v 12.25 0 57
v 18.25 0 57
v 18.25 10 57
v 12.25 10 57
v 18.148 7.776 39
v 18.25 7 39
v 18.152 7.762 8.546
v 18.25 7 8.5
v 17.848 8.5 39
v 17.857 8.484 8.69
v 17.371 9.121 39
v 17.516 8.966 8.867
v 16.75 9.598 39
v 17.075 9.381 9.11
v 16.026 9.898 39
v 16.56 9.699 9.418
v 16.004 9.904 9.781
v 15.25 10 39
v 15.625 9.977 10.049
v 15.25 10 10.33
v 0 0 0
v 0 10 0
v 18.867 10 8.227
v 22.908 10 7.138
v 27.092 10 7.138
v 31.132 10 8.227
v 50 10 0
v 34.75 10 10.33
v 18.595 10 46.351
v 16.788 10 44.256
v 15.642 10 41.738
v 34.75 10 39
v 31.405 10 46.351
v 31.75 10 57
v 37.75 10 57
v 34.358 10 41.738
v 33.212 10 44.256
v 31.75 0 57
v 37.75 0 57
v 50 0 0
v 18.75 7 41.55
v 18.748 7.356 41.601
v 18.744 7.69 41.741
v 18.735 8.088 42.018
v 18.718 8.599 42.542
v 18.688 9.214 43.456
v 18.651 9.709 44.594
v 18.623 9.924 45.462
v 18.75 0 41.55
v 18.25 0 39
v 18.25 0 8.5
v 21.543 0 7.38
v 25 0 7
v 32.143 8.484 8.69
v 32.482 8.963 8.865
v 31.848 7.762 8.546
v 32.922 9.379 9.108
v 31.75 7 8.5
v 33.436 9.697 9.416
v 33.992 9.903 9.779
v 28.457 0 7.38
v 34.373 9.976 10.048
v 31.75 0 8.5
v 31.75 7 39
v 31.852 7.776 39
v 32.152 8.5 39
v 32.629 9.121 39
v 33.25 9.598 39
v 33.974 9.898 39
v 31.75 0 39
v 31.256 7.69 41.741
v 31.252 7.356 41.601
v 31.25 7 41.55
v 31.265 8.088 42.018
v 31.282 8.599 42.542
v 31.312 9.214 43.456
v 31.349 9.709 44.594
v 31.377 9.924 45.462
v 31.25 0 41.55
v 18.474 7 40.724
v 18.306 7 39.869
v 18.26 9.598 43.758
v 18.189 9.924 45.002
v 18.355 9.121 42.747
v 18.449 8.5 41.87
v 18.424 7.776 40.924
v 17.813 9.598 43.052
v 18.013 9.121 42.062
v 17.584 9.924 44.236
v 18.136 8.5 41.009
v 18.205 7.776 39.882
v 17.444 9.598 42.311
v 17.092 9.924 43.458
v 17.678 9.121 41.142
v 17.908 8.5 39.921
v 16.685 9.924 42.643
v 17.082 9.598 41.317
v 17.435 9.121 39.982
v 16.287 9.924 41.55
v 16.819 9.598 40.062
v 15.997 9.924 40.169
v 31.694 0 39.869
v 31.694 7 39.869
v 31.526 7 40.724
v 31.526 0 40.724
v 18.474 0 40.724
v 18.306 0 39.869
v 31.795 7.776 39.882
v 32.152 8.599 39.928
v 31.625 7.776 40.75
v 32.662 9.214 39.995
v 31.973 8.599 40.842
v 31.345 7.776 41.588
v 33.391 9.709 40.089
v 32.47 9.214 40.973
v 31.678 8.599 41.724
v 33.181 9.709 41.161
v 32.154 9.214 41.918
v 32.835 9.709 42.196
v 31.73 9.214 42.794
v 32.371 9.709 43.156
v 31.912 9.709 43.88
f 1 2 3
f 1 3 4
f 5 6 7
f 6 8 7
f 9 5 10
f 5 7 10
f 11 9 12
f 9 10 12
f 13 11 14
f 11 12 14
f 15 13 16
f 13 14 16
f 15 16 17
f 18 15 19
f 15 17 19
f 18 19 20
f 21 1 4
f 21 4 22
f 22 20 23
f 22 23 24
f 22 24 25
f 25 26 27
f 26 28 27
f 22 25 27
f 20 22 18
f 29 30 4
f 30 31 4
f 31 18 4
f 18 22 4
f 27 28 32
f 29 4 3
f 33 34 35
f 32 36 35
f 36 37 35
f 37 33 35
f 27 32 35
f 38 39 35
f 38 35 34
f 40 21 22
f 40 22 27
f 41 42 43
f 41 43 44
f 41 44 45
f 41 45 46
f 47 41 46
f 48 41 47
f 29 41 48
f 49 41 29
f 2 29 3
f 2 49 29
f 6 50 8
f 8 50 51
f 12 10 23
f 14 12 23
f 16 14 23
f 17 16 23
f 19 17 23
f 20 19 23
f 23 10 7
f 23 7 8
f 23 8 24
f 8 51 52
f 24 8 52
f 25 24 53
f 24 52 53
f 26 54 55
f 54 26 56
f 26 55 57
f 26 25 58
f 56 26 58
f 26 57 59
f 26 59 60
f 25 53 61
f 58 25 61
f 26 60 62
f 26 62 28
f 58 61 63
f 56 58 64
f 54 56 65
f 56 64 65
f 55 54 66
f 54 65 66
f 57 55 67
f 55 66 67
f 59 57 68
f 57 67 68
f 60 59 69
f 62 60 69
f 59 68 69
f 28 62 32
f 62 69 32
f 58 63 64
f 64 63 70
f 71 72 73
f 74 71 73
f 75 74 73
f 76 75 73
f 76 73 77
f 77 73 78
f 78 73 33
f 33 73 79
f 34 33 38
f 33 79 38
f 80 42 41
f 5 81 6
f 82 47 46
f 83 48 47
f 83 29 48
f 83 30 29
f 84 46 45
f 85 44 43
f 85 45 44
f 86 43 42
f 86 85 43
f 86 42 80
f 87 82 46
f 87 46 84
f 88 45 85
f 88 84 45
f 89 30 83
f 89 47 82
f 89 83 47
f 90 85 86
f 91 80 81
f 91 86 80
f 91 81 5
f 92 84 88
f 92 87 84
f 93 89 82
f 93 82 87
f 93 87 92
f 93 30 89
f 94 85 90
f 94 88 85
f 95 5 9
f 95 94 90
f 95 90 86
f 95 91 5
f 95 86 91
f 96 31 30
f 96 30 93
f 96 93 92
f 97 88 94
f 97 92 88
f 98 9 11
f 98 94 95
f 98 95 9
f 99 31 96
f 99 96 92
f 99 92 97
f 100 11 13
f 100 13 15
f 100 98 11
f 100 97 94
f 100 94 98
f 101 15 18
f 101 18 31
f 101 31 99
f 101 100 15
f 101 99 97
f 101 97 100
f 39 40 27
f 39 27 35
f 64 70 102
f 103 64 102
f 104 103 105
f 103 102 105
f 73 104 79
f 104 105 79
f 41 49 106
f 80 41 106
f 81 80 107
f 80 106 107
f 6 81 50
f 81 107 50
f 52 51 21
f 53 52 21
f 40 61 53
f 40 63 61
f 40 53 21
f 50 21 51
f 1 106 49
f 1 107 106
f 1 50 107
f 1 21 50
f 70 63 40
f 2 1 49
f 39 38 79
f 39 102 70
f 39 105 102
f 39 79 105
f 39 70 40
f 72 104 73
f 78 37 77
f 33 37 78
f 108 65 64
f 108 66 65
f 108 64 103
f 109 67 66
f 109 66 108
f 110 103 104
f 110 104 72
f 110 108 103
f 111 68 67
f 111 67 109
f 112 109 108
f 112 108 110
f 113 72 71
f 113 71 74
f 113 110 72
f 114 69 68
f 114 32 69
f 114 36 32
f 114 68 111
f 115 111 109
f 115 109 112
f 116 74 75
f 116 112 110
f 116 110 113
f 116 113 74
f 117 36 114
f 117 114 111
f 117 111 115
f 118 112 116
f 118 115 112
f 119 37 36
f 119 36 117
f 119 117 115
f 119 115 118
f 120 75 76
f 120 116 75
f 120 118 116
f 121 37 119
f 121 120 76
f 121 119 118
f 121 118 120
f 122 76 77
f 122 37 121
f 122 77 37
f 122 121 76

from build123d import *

# Parameters (mm, degrees)
PAD006_DEPTH = 10
FILLET001_R  = 3
PAD010_DEPTH = 4


with BuildPart() as part:
    # Sketch006 → Pad006 (new body)
    with BuildSketch(Plane.XZ):
        with BuildLine():
            Line((18.25, 57), (12.25, 57))
            Line((12.25, 57), (0, 0))
            Line((0, 0), (50, 0))
            Line((50, 0), (37.75, 57))
            Line((37.75, 57), (31.75, 57))
            Line((31.25, 41.54951), (31.75, 57))
            ThreePointArc((31.75, 39), (31.623821, 40.299038), (31.25, 41.54951))
            Line((31.749944, 8.5), (31.75, 39))
            ThreePointArc((18.249944, 8.5), (24.999944, 7), (31.749944, 8.5))
            Line((18.25, 39), (18.249944, 8.5))
            ThreePointArc((18.75, 41.54951), (18.376179, 40.299038), (18.25, 39))
            Line((18.75, 41.54951), (18.25, 57))
        make_face()
    extrude(amount=-PAD006_DEPTH)

    # Fillet001
    fillet001_edges = [part.edges().sort_by_distance(p)[0] for p in [
        (31.749972, 10, 23.75),
        (18.249972, 10, 23.75),
    ]]
    fillet(fillet001_edges, radius=FILLET001_R)

    # Sketch009 → Pad010 (join)
    with BuildSketch(Plane.XZ):
        Polygon((11, 6), (39, 6), (39, 0), (35, 0), (15, 0), (11, 0), align=None)
    extrude(amount=-PAD010_DEPTH)


solid = part.part
